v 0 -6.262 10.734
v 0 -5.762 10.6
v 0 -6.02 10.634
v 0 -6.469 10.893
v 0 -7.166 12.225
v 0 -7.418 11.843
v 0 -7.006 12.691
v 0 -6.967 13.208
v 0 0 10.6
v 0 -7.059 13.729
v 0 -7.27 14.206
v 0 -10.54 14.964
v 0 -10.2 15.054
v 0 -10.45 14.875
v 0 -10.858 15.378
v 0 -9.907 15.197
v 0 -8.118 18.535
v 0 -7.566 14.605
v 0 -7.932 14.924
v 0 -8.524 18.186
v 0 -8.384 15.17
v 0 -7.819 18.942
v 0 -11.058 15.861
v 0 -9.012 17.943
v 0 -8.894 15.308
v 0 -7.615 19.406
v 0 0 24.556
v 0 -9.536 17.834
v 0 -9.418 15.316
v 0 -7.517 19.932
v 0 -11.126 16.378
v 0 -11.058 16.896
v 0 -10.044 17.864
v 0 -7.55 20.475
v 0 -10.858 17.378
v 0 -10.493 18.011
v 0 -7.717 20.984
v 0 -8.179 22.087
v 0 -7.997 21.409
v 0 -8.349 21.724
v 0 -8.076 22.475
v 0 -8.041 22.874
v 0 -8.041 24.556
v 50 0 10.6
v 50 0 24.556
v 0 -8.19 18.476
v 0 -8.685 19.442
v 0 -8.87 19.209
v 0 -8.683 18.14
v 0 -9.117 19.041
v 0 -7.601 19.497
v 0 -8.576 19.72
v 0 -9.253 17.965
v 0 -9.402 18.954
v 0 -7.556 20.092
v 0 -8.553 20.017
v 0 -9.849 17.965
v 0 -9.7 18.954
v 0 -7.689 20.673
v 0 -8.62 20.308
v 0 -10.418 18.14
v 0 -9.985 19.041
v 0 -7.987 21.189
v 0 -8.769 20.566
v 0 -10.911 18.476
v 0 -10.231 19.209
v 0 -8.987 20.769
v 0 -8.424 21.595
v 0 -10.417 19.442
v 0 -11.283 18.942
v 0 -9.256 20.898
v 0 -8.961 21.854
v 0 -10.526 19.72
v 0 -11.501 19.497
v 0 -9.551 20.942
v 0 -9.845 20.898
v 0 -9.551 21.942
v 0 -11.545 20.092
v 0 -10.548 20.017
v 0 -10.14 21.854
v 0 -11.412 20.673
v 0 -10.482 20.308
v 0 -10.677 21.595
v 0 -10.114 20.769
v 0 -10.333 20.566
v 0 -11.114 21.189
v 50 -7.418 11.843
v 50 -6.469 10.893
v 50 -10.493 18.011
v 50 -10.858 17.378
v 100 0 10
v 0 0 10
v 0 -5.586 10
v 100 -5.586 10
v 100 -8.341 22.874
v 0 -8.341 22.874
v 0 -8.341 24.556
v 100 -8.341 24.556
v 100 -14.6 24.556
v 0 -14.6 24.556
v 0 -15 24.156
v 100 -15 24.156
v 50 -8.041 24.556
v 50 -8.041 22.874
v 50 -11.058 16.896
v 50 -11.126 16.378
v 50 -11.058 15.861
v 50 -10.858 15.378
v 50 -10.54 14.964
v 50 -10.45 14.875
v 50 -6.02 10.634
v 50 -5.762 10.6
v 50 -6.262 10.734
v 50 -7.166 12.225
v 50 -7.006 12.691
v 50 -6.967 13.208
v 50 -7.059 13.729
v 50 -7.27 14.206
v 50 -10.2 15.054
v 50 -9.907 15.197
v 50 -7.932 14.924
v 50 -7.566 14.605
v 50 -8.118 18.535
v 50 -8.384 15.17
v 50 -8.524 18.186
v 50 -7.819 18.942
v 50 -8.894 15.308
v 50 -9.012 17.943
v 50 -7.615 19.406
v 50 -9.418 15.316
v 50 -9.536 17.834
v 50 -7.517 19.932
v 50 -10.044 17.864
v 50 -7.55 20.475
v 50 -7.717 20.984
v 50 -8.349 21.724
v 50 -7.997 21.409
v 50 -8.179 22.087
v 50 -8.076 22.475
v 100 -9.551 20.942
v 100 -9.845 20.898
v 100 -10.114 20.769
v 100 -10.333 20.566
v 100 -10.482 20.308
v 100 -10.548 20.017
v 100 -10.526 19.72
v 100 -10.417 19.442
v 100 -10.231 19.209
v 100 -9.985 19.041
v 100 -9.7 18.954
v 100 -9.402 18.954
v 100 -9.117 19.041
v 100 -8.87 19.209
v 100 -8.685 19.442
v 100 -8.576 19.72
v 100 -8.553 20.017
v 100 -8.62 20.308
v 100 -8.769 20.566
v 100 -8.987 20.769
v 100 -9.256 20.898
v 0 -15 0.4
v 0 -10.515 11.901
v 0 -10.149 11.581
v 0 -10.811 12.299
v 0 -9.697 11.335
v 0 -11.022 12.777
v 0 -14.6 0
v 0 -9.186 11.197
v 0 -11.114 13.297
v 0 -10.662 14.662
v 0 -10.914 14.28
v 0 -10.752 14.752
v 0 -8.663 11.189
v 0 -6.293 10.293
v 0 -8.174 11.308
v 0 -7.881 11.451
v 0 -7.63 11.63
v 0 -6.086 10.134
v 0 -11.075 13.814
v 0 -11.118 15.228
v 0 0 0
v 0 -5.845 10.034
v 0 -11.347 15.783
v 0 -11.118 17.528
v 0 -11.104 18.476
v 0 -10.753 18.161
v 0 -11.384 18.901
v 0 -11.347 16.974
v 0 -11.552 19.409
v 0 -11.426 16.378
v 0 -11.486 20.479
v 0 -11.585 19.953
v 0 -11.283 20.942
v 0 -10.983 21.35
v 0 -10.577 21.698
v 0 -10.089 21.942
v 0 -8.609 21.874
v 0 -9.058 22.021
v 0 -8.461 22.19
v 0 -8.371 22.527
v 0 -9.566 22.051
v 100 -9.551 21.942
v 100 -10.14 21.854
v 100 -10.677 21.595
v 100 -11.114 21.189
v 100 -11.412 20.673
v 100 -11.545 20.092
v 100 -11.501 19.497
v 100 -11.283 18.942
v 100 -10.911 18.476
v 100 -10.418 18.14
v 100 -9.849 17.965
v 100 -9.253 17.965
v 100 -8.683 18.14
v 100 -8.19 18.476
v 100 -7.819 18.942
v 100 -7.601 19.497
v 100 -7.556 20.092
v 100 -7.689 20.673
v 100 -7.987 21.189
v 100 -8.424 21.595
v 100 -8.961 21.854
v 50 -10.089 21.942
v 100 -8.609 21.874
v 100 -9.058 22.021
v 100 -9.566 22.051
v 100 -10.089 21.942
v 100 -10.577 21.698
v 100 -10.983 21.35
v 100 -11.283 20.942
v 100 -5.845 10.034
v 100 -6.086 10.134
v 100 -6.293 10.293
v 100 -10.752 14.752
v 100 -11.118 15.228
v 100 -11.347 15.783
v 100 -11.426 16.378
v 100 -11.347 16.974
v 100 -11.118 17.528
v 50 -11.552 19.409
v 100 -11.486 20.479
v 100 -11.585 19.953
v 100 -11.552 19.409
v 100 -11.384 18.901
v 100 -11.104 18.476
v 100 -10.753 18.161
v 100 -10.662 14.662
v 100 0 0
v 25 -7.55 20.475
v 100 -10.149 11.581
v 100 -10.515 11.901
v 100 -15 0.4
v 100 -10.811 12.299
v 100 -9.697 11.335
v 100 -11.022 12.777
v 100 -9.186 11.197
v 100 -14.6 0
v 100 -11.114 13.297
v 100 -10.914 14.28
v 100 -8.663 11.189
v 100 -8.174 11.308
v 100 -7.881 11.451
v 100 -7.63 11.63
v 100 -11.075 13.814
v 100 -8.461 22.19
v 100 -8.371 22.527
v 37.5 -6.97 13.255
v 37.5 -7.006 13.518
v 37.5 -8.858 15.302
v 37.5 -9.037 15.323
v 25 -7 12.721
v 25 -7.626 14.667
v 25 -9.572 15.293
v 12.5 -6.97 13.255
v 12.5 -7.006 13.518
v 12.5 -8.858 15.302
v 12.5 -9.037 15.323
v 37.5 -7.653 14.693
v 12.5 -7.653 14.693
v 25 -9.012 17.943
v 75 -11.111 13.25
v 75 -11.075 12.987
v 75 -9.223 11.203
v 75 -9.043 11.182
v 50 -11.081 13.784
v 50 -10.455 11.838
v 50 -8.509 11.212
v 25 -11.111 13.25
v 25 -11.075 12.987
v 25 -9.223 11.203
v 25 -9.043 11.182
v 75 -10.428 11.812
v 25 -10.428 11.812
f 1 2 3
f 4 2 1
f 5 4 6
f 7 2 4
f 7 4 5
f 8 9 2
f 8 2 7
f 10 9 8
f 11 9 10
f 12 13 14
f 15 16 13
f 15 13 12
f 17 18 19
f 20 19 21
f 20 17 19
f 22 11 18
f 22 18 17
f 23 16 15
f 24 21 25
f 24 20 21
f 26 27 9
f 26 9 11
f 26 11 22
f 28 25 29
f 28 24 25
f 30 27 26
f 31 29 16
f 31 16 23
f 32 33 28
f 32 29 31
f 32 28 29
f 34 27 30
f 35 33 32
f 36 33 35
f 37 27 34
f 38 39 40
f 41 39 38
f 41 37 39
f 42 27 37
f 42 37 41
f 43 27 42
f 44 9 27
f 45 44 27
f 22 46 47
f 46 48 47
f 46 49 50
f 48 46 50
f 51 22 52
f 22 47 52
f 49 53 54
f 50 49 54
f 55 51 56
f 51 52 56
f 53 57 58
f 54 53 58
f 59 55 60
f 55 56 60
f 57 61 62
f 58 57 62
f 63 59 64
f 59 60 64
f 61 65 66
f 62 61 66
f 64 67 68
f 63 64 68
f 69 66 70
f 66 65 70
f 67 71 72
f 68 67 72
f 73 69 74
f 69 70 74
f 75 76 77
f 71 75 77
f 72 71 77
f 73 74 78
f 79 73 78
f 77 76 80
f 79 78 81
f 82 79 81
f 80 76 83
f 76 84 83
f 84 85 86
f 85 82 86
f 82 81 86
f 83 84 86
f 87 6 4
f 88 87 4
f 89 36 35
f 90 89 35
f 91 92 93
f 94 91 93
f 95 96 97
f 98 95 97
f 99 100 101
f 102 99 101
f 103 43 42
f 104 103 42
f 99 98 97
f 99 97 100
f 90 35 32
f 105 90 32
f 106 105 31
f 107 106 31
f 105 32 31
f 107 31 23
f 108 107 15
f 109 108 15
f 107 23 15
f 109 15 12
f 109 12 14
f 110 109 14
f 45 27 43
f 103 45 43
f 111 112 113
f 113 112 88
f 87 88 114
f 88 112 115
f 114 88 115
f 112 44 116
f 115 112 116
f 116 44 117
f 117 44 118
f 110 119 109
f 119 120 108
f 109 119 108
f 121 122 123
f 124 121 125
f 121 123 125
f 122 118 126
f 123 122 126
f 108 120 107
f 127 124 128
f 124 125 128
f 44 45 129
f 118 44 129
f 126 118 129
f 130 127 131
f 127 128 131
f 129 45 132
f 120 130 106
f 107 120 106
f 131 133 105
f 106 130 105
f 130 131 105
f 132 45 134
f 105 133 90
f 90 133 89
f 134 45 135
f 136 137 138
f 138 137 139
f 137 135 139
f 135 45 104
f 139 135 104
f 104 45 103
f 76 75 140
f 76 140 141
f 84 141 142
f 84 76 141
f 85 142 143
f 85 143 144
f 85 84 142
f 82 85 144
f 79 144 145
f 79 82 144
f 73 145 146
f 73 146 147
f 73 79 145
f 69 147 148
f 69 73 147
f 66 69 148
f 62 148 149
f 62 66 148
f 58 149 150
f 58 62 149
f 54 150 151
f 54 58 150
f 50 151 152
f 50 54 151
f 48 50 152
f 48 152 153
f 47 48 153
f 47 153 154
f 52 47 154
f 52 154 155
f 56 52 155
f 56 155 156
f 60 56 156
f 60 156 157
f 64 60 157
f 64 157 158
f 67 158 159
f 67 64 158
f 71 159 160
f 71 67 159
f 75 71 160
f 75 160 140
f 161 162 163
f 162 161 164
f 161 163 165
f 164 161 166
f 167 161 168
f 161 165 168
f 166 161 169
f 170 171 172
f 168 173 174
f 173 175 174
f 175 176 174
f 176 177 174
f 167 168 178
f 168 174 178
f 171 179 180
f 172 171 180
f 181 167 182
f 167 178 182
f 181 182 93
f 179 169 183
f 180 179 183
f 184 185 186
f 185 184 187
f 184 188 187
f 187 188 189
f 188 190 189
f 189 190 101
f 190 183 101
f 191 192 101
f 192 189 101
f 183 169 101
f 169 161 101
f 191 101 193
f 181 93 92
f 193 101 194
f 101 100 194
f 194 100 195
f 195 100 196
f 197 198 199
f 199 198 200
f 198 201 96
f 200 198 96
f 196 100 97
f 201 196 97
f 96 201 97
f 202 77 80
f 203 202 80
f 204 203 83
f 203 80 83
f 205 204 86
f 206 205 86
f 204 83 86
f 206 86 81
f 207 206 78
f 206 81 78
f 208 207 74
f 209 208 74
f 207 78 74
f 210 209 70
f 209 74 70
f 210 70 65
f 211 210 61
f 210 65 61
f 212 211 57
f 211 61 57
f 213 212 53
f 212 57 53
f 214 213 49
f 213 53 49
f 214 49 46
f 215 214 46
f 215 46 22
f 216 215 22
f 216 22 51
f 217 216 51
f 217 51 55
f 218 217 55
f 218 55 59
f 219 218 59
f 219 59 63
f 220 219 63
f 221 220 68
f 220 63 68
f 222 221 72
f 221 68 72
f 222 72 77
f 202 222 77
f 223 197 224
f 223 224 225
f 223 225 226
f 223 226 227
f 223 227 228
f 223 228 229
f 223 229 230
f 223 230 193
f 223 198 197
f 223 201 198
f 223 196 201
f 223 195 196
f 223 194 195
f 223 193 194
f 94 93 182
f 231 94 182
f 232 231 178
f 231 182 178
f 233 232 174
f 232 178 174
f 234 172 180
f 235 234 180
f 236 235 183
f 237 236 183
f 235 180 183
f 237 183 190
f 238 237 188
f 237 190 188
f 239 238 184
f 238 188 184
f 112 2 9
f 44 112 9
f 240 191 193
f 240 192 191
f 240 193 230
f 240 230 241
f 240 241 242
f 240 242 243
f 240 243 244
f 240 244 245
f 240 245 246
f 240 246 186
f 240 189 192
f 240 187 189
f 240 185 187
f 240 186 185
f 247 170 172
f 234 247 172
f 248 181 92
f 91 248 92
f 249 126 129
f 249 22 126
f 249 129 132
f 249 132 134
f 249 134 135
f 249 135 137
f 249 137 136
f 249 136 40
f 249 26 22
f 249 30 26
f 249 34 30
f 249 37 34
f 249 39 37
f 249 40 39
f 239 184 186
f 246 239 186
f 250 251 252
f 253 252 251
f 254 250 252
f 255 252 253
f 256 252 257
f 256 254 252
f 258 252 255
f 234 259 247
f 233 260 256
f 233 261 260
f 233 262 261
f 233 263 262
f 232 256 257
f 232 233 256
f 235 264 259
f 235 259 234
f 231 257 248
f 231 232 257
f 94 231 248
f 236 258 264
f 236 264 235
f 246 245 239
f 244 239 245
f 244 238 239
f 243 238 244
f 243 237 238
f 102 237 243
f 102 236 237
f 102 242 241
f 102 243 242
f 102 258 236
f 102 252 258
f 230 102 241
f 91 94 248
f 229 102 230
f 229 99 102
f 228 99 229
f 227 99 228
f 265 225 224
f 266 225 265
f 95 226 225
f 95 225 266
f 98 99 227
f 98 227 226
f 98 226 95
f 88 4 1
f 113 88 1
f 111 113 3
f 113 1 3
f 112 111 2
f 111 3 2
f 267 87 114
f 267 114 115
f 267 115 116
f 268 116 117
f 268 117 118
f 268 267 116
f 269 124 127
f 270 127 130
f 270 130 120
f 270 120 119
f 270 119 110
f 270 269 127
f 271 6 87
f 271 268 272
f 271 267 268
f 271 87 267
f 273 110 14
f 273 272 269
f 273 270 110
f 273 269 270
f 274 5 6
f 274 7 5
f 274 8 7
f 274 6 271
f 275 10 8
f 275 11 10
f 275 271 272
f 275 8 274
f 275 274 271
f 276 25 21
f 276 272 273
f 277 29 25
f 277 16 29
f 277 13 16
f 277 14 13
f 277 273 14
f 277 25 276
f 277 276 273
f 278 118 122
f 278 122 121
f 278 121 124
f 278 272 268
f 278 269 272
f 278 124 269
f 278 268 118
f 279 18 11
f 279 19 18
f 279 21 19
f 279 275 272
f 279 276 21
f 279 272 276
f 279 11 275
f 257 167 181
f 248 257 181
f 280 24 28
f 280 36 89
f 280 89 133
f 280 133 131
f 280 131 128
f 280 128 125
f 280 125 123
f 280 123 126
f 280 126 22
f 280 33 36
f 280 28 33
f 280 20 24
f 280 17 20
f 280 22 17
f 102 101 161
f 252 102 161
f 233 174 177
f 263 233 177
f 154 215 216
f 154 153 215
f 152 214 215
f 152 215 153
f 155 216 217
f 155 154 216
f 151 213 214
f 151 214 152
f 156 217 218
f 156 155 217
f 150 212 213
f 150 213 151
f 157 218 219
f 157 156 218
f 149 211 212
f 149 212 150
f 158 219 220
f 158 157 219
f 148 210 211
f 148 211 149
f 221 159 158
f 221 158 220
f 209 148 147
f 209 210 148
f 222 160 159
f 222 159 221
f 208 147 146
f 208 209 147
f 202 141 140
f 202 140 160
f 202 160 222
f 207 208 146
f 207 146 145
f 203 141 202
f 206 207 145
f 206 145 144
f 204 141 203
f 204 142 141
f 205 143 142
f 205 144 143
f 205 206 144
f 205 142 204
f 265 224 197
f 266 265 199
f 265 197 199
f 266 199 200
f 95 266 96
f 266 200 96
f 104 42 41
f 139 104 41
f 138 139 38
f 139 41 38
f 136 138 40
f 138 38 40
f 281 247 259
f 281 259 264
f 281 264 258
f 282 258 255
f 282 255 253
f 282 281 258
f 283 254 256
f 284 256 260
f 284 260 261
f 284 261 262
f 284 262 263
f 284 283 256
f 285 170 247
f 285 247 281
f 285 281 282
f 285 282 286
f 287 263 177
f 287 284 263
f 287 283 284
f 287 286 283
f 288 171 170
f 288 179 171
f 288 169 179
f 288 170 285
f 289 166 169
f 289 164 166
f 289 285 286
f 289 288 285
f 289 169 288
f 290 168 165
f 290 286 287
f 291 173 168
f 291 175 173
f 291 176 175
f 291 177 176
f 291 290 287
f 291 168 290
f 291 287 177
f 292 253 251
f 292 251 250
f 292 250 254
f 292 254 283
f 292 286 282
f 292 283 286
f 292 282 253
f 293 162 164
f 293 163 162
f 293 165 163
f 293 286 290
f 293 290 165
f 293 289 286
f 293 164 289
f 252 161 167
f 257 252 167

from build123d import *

# Parameters (mm, degrees)
BOSS_EXTRUDE1_DEPTH = 100
BOSS_EXTRUDE2_DEPTH = 50
SKETCH1_4_R         = 2
SKETCH1_4_R_2       = 1
BOSS_EXTRUDE3_DEPTH = 100


with BuildPart() as part:
    # Sketch1 → Boss-Extrude1 (new body)
    with BuildSketch(Plane.YZ):
        with BuildLine():
            Line((-14.6, 0), (0, 0))
            Line((0, 0), (0, 10))
            Line((0, 10), (-5.585786438, 10))
            ThreePointArc((-5.585786438, 10), (-5.96846987, 10.076120467), (-6.292893219, 10.292893219))
            Line((-6.292893219, 10.292893219), (-7.630448846, 11.630448846))
            add(Edge.make_bspline(
                [(-10.662444373, 14.662444373), (-11.864824632, 13.248529542), (-10.454594155, 11.838299064), (-9.044363677, 10.428068587), (-7.630448846, 11.630448846)],
                knots=[0.075070491, 0.075070491, 0.075070491, 1.570796327, 1.570796327, 3.066522163, 3.066522163, 3.066522163], degree=2, weights=[1, 0.733143915, 1, 0.733143915, 1]))
            Line((-10.662444373, 14.662444373), (-10.752061132, 14.752061132))
            Line((-10.752061132, 14.752061132), (-12, 16))
            Line((-12, 16), (-11.117573964, 17.528406729))
            Line((-11.117573964, 17.528406729), (-10.75254502, 18.160655405))
            add(Edge.make_bspline(
                [(-11.282719811, 20.942365731), (-12.279903121, 19.215193255), (-10.75254502, 18.160655405)],
                knots=[1.570796412, 1.570796412, 1.570796412, 3.066522163, 3.066522163, 3.066522163], degree=2, weights=[1, 0.733143944, 1]))
            add(Edge.make_bspline(
                [(-8.608600423, 21.874076377), (-10.285536329, 22.669538504), (-11.282719811, 20.942365731)],
                knots=[0.075070491, 0.075070491, 0.075070491, 1.570796412, 1.570796412, 1.570796412], degree=2, weights=[1, 0.733143886, 1]))
            ThreePointArc((-8.608600423, 21.874076377), (-8.408799578, 22.356438286), (-8.34065123, 22.874076377))
            Line((-8.34065123, 22.874076377), (-8.34065123, 24.555864176))
            Line((-8.34065123, 24.555864176), (-14.6, 24.555864176))
            Line((-14.6, 24.555864176), (-15, 24.155864176))
            Line((-15, 24.155864176), (-15, 0.4))
            Line((-15, 0.4), (-14.6, 0))
        make_face()
        with BuildLine():
            Line((-12, 16), (-10.752061132, 14.752061132))
            ThreePointArc((-10.752061132, 14.752061132), (-11.406038716, 16.078196486), (-11.117573964, 17.528406729))
            Line((-11.117573964, 17.528406729), (-12, 16))
        make_face()
    extrude(amount=BOSS_EXTRUDE1_DEPTH)


with BuildPart() as body_2:
    # Sketch1<3> → Boss-Extrude2 (new body)
    with BuildSketch(Plane.YZ):
        with BuildLine():
            add(Edge.make_bspline(
                [(-7.418316812, 11.84258088), (-6.215936552, 13.256495711), (-7.62616703, 14.666726189), (-9.036397507, 16.076956667), (-10.450312338, 14.874576407)],
                knots=[3.216663145, 3.216663145, 3.216663145, 4.71238898, 4.71238898, 6.208114816, 6.208114816, 6.208114816], degree=2, weights=[1, 0.733143915, 1, 0.733143915, 1]))
            Line((-7.418316812, 11.84258088), (-6.46862915, 10.892893219))
            ThreePointArc((-6.46862915, 10.892893219), (-6.144205801, 10.676120467), (-5.761522369, 10.6))
            Line((-5.761522369, 10.6), (0, 10.6))
            Line((0, 10.6), (0, 24.555864176))
            Line((0, 24.555864176), (-7.060269515, 24.555864176))
            Line((-7.060269515, 24.555864176), (-8.04065123, 24.555864176))
            Line((-8.04065123, 24.555864176), (-8.04065123, 22.874076377))
            ThreePointArc((-8.04065123, 22.874076377), (-8.11902183, 22.278792573), (-8.348792802, 21.724076377))
            add(Edge.make_bspline(
                [(-7.818617405, 18.9423671), (-6.821435564, 20.669539122), (-8.348792802, 21.724076377)],
                knots=[4.71238963, 4.71238963, 4.71238963, 6.208114816, 6.208114816, 6.208114816], degree=2, weights=[1, 0.733144136, 1]))
            add(Edge.make_bspline(
                [(-10.492737399, 18.010655405), (-8.815800545, 17.215192828), (-7.818617405, 18.9423671)],
                knots=[3.216663145, 3.216663145, 3.216663145, 4.71238963, 4.71238963, 4.71238963], degree=2, weights=[1, 0.733143694, 1]))
            Line((-10.492737399, 18.010655405), (-10.857766343, 17.378406729))
            ThreePointArc((-10.857766343, 17.378406729), (-11.108605258, 16.117354344), (-10.539929097, 14.964193166))
            Line((-10.539929097, 14.964193166), (-10.450312338, 14.874576407))
        make_face()
    extrude(amount=BOSS_EXTRUDE2_DEPTH)


with BuildPart() as body_3:
    # Sketch1<4> → Boss-Extrude3 (new body)
    with BuildSketch(Plane.YZ):
        with Locations(Location((-9.550668911, 19.942365891, 0), (0, 0, 90))):
            Circle(SKETCH1_4_R)
        with Locations(Location((-9.550668911, 19.942365891, 0), (0, 0, 90))):
            Circle(SKETCH1_4_R_2, mode=Mode.SUBTRACT)
    extrude(amount=BOSS_EXTRUDE3_DEPTH)


solid = Compound([part.part, body_2.part, body_3.part])
